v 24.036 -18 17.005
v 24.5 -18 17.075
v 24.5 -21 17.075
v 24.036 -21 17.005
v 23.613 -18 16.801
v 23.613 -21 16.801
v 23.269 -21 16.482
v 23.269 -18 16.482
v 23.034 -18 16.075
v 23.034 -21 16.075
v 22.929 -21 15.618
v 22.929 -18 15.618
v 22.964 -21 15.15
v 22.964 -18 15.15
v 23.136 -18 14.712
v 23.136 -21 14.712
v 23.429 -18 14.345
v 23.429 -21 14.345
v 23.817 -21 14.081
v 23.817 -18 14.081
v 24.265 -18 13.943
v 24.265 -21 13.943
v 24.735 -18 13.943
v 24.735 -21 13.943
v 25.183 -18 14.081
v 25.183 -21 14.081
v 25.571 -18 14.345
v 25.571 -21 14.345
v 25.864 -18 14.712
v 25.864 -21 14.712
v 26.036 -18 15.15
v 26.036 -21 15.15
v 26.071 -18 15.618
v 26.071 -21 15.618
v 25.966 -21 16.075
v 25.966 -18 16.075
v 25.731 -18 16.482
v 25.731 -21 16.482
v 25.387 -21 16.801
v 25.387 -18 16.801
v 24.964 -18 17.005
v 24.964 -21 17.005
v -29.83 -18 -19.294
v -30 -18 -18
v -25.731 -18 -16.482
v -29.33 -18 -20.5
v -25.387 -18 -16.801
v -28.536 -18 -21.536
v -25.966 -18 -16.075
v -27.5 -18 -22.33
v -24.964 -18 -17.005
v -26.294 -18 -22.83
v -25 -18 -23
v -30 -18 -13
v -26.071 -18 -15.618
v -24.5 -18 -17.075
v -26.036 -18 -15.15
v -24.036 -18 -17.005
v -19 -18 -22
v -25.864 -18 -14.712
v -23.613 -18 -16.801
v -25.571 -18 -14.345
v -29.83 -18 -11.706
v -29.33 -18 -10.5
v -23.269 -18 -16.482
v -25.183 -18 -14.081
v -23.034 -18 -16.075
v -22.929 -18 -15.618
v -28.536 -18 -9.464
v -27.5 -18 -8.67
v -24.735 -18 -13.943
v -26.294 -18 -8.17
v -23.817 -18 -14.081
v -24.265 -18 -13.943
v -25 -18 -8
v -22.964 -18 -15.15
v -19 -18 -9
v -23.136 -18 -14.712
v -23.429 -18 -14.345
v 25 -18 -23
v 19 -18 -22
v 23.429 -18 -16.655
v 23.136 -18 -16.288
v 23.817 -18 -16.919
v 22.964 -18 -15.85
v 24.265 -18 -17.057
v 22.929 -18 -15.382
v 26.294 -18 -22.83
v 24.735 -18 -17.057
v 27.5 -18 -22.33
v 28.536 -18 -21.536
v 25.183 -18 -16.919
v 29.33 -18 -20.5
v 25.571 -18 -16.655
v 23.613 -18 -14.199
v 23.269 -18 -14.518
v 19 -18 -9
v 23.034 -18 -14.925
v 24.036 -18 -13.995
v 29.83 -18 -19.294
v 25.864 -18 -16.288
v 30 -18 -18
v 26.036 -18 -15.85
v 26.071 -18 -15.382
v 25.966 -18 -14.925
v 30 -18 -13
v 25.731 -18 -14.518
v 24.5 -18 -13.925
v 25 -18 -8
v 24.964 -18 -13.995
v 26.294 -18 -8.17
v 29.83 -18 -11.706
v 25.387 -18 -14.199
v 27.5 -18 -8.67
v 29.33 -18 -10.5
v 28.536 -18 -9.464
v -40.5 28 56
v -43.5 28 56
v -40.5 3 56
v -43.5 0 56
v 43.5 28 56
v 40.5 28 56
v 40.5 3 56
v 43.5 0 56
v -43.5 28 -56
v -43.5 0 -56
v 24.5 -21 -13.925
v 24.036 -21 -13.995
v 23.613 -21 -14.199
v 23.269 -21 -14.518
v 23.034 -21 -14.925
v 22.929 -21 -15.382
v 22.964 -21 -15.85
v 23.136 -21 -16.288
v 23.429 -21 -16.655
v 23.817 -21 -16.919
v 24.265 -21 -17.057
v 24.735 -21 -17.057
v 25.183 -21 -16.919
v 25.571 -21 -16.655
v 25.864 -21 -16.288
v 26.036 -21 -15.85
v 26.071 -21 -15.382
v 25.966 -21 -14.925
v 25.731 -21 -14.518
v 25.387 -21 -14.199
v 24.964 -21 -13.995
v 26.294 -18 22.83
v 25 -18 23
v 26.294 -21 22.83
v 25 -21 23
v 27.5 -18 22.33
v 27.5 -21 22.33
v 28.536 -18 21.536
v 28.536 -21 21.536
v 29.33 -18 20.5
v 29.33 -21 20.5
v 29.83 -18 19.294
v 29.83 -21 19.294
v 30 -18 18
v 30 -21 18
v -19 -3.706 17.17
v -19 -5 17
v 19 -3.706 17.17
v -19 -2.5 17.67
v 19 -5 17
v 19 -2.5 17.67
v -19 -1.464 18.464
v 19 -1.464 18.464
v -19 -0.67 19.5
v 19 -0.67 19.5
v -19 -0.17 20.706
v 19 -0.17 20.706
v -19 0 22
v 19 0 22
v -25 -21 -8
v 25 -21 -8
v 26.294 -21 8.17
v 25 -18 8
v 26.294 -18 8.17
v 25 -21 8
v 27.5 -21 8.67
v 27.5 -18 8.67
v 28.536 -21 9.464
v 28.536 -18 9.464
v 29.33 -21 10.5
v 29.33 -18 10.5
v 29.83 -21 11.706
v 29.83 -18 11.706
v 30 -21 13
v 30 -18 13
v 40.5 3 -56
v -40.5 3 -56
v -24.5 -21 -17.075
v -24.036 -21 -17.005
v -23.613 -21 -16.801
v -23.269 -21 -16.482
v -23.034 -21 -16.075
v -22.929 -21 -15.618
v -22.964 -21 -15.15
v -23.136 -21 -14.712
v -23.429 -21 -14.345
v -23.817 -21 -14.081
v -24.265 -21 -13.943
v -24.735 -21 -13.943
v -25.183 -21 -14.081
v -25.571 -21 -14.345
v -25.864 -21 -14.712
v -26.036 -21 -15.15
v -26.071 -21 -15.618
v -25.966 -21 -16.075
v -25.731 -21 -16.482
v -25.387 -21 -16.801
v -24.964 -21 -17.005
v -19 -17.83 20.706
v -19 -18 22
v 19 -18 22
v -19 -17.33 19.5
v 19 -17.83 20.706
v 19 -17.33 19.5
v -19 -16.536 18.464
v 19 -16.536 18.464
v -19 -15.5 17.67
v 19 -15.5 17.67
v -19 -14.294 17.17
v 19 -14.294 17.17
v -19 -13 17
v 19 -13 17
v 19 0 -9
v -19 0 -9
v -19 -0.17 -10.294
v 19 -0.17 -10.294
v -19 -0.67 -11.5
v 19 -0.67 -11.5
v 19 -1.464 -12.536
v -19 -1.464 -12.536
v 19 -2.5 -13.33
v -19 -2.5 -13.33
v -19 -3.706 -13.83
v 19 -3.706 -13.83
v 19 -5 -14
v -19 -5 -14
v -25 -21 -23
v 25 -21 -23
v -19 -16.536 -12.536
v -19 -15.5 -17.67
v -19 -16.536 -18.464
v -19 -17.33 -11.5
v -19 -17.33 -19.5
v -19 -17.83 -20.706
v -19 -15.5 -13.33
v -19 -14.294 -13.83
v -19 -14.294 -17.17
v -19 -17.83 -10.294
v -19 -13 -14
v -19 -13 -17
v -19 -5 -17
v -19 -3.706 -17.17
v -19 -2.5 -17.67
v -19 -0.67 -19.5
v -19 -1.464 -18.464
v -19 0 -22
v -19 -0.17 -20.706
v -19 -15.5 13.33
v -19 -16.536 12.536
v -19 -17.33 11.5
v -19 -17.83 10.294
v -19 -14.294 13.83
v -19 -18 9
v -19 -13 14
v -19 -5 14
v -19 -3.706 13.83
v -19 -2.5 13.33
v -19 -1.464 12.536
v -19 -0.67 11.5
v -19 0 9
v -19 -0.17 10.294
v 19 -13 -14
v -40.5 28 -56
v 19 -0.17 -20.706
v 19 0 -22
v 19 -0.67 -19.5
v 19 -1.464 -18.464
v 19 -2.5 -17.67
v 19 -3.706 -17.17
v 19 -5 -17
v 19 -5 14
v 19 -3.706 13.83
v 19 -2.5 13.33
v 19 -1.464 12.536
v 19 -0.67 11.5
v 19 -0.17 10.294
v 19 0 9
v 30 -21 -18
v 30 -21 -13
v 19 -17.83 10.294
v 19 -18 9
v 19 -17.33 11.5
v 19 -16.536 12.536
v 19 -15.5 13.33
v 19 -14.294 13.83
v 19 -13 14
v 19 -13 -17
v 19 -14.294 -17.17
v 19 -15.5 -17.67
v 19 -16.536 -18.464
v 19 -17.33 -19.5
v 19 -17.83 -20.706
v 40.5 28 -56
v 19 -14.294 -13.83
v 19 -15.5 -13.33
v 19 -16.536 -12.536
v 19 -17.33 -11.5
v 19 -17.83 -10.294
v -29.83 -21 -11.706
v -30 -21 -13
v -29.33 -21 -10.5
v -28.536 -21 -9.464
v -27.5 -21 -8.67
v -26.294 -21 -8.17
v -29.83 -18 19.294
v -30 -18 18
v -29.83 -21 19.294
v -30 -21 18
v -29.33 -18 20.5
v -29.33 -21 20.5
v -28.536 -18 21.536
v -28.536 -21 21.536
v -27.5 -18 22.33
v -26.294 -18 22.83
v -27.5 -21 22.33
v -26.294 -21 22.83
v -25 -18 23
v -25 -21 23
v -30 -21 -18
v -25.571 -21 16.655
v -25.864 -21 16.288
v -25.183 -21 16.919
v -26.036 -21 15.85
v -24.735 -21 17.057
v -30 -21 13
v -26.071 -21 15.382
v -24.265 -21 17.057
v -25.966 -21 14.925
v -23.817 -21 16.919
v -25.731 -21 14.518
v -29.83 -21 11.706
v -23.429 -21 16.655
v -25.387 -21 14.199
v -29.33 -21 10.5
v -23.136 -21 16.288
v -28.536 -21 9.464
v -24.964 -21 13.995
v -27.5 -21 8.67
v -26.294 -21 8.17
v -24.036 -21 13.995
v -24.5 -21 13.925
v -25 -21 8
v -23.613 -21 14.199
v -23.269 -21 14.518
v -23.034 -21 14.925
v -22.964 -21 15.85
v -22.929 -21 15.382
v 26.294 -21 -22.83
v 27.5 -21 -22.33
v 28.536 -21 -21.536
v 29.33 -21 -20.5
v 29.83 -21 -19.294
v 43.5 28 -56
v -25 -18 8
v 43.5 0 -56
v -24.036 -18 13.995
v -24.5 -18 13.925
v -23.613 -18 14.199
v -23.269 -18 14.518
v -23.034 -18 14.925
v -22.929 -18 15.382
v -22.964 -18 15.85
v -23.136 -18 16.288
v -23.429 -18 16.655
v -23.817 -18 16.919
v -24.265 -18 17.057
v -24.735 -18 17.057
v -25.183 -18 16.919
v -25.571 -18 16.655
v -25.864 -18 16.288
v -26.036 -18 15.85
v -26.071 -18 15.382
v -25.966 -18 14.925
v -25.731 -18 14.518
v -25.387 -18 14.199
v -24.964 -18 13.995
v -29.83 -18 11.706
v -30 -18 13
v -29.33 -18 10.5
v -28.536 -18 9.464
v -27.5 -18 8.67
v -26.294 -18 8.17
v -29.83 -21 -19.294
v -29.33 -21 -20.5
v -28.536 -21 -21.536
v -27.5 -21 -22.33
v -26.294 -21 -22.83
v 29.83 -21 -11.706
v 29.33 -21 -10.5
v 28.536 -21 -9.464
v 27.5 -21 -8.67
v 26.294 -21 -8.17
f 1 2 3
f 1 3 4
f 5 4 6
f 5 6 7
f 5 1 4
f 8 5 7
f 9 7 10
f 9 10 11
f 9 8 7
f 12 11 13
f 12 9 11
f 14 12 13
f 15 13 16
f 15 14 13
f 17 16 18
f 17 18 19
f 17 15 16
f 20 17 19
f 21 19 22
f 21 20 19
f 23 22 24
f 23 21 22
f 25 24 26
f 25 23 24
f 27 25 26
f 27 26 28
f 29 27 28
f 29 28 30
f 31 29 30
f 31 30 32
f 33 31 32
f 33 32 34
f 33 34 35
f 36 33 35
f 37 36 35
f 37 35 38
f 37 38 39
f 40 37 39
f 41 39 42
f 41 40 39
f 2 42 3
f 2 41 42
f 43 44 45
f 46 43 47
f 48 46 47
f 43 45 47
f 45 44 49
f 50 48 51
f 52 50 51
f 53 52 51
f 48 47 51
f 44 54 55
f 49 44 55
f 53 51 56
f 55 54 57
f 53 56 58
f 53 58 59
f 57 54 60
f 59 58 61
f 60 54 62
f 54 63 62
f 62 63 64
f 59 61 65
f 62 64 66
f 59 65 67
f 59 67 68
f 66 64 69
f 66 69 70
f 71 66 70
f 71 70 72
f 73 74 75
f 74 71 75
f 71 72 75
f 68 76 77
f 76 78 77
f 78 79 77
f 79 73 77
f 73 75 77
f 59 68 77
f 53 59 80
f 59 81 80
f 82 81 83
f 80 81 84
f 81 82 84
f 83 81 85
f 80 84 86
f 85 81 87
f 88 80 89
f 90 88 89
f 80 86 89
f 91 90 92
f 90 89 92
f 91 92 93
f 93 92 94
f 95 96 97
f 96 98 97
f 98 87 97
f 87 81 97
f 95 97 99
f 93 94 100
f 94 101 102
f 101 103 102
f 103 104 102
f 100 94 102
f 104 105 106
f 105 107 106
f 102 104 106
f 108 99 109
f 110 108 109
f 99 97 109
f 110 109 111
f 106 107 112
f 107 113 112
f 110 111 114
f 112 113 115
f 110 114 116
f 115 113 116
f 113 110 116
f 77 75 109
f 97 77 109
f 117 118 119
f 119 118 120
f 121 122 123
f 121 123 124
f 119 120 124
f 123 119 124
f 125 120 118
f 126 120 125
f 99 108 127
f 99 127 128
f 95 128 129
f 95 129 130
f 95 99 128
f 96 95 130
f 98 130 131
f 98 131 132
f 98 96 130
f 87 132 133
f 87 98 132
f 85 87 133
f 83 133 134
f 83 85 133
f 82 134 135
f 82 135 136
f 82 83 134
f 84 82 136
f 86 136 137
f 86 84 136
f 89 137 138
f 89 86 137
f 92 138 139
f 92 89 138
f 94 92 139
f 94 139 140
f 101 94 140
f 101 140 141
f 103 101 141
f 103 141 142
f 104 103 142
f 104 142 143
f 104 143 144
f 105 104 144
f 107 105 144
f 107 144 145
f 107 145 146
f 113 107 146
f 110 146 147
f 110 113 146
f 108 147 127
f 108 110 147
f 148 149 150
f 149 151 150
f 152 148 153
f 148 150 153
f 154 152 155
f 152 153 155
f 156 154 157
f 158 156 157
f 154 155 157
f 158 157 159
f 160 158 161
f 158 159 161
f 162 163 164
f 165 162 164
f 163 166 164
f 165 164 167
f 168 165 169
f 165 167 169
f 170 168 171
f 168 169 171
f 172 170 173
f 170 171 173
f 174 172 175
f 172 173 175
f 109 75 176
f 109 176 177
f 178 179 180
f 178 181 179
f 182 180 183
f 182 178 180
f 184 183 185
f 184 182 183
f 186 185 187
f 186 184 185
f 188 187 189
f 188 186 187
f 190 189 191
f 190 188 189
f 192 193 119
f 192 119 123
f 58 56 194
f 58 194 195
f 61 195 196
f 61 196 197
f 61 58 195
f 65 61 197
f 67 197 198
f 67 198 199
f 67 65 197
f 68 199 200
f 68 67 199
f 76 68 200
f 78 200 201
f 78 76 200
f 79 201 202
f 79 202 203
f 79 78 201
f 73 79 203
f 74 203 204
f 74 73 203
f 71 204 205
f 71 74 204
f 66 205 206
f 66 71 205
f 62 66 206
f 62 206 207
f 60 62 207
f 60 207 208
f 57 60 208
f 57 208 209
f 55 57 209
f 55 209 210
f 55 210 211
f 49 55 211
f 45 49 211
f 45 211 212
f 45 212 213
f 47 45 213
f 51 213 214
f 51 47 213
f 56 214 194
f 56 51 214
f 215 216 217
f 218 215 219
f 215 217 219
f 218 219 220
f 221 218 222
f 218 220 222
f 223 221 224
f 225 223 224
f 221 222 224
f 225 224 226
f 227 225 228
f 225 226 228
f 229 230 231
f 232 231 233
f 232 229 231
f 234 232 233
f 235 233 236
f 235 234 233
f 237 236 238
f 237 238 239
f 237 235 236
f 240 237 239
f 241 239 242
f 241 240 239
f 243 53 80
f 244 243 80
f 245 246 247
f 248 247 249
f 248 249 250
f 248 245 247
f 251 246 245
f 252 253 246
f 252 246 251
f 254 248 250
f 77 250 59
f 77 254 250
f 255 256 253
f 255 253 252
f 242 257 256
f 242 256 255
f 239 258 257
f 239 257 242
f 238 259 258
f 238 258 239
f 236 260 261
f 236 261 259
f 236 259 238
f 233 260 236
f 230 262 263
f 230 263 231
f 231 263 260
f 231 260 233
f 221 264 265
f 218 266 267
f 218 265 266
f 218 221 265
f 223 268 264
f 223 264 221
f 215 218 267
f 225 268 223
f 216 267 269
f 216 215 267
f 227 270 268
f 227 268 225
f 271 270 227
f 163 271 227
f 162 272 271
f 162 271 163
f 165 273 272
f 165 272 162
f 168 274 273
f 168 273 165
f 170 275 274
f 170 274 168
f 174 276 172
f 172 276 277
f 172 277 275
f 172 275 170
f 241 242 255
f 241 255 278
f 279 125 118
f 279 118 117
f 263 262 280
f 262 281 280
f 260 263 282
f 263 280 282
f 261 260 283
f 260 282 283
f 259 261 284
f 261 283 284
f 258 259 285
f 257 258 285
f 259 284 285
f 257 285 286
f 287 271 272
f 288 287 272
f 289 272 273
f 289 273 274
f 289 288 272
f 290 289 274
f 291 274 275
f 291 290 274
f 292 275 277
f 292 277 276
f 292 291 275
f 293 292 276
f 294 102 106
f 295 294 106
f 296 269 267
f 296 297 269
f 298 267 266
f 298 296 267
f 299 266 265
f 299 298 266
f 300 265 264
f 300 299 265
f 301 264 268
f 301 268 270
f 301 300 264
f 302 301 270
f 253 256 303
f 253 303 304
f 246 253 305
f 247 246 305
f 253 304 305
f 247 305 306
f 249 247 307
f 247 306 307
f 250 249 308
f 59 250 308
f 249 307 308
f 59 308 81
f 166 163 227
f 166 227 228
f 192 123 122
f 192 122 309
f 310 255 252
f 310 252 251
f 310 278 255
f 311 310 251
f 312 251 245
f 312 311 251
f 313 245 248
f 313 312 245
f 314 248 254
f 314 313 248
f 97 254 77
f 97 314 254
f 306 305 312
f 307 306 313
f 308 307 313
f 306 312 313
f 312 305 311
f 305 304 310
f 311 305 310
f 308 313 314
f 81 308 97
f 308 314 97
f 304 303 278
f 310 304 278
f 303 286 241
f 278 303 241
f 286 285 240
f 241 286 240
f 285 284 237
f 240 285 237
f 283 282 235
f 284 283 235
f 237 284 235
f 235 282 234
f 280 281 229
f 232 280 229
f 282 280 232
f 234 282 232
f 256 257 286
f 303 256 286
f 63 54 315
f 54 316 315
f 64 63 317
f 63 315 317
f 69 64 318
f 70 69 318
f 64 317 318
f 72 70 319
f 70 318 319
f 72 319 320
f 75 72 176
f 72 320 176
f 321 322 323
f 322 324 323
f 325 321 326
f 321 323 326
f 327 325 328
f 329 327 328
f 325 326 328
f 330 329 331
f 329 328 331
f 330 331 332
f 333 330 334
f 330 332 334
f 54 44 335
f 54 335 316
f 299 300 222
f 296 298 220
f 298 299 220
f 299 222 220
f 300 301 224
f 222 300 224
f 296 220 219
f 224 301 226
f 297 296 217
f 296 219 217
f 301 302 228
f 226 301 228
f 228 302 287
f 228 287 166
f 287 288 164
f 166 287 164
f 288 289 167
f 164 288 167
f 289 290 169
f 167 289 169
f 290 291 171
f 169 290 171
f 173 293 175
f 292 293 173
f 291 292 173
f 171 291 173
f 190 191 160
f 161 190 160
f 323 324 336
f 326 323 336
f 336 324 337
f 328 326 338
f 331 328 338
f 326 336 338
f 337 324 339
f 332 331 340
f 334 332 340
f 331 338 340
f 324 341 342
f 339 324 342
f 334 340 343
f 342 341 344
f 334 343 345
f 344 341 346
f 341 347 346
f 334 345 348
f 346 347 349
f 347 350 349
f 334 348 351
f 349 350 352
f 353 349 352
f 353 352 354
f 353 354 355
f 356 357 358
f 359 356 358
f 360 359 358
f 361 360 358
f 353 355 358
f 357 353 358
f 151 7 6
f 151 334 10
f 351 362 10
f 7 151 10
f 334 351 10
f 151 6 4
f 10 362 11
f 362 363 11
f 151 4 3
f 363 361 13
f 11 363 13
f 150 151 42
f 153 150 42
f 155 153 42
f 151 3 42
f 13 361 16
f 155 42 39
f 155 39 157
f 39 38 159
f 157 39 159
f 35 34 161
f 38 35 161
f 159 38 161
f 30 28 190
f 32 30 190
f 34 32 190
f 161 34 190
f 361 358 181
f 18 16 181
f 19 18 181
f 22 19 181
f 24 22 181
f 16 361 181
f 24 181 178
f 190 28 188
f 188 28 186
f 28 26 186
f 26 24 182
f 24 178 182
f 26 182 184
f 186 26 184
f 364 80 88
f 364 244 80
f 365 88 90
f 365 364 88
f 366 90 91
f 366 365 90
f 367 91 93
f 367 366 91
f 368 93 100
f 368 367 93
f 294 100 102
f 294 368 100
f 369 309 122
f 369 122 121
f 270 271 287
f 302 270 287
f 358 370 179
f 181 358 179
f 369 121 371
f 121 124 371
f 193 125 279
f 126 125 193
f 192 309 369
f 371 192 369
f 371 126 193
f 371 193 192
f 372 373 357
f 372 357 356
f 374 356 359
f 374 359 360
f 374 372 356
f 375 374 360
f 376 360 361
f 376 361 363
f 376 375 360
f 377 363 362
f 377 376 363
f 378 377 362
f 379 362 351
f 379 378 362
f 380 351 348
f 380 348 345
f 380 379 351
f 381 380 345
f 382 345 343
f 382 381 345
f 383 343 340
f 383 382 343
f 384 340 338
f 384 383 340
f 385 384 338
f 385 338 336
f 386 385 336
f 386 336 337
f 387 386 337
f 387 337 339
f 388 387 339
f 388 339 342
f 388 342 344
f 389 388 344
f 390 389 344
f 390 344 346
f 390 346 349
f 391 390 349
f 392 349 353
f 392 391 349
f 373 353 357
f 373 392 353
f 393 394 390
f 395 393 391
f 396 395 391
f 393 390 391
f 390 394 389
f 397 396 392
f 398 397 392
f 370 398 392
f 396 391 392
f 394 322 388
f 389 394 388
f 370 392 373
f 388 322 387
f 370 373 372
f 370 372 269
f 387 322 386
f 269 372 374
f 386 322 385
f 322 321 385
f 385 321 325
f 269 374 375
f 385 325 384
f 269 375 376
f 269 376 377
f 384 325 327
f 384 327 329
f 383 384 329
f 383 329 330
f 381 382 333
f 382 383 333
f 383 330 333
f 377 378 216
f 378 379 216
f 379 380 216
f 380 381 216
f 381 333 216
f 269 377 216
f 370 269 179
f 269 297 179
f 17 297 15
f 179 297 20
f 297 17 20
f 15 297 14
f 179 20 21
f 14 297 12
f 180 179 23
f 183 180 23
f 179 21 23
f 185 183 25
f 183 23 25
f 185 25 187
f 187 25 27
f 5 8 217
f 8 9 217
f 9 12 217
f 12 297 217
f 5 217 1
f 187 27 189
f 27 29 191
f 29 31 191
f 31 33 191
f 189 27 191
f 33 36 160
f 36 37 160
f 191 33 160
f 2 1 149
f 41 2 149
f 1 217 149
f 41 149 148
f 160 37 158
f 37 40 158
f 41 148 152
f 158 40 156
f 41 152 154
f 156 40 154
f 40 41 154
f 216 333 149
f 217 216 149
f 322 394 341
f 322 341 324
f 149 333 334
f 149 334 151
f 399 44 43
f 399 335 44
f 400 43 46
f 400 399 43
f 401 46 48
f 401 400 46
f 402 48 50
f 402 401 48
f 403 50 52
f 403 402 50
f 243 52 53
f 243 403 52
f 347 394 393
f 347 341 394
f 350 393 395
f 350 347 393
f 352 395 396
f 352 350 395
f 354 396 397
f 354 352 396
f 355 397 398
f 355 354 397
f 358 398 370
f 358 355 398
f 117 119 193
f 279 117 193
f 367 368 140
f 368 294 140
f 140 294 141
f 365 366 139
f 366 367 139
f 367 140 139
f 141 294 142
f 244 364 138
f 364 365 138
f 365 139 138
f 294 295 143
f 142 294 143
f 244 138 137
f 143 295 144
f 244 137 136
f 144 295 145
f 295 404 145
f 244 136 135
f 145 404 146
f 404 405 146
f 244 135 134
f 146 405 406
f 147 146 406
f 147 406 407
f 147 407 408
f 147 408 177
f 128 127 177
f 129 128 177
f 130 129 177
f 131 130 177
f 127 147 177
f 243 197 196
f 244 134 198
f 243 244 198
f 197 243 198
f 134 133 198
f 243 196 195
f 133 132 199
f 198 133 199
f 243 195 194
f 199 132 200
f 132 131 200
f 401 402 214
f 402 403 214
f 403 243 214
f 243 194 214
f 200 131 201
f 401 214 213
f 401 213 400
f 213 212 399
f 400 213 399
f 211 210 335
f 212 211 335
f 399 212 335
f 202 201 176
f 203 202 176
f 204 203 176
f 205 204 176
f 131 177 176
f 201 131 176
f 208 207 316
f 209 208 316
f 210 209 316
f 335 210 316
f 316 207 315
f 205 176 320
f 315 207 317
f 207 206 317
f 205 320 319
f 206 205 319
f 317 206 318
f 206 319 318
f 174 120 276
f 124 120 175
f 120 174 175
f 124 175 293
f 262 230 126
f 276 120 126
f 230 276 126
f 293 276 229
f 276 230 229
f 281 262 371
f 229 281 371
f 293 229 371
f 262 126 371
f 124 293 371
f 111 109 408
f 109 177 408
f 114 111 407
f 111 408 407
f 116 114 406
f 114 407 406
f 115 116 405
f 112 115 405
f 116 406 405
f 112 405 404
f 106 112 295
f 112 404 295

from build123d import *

# Parameters (mm, degrees)
SKETCH1_W             = 87
SKETCH1_H             = 112
BOSS_EXTRUDE1_DEPTH   = 3
SKETCH2_W             = 38
SKETCH2_H             = 3
BOSS_EXTRUDE2_DEPTH   = 18
SKETCH8_W             = 60
SKETCH8_H             = 15
SKETCH8_R             = 1.575
SKETCH8_W_2           = 38
SKETCH8_H_2           = 3
BOSS_EXTRUDE5_DEPTH   = 3
BOSS_EXTRUDE5_2_DEPTH = 3
SKETCH9_W             = 38
SKETCH9_H             = 3
BOSS_EXTRUDE6_DEPTH   = 3
SKETCH10_W            = 38
SKETCH10_H            = 3
BOSS_EXTRUDE7_DEPTH   = 3
FILLET2_R             = 5
FILLET3_R             = 5
FILLET4_R             = 5
SKETCH12_W            = 3
SKETCH12_H            = 112
BOSS_EXTRUDE8_DEPTH   = 25


with BuildPart() as part:
    # Sketch1 → Boss-Extrude1 (new body)
    with BuildSketch(Plane(origin=(0, 0, 0), x_dir=(1, 0, 0), z_dir=(0, 1, 0))):
        Rectangle(SKETCH1_W, SKETCH1_H)
    extrude(amount=BOSS_EXTRUDE1_DEPTH)

    # Sketch2 → Boss-Extrude2 (add)
    with BuildSketch(Plane.XZ):
        with Locations((0, -15.5)):
            Rectangle(SKETCH2_W, SKETCH2_H)
        with Locations((0, 15.5)):
            Rectangle(SKETCH2_W, SKETCH2_H)
    extrude(amount=BOSS_EXTRUDE2_DEPTH)



with BuildPart() as body_2:
    # Sketch8 → Boss-Extrude5 (new body)
    with BuildSketch(Plane.XZ.offset(18)):
        with Locations((0, 15.5)):
            Rectangle(SKETCH8_W, SKETCH8_H)
        with Locations(Location((-24.5, 15.5, 0), (0, 0, 270))):
            Circle(SKETCH8_R, mode=Mode.SUBTRACT)
        with Locations(Location((24.5, 15.5, 0), (0, 0, 90))):
            Circle(SKETCH8_R, mode=Mode.SUBTRACT)
        with Locations((0, 15.5)):
            Rectangle(SKETCH8_W_2, SKETCH8_H_2, mode=Mode.SUBTRACT)
    extrude(amount=BOSS_EXTRUDE5_DEPTH)


with BuildPart() as body_3:
    # Sketch8 → Boss-Extrude5 2 (new body)
    with BuildSketch(Plane.XZ.offset(18)):
        with Locations((0, -15.5)):
            Rectangle(SKETCH8_W, SKETCH8_H)
        with Locations(Location((-24.5, -15.5, 0), (0, 0, 270))):
            Circle(SKETCH8_R, mode=Mode.SUBTRACT)
        with Locations(Location((24.5, -15.5, 0), (0, 0, 90))):
            Circle(SKETCH8_R, mode=Mode.SUBTRACT)
        with Locations((0, -15.5)):
            Rectangle(SKETCH8_W_2, SKETCH8_H_2, mode=Mode.SUBTRACT)
    extrude(amount=BOSS_EXTRUDE5_2_DEPTH)


with BuildPart() as part_1:
    add(part.part)

    add(body_2.part)  # Boss-Extrude6 merges body 2
    # Sketch9 → Boss-Extrude6 (add)
    with BuildSketch(Plane.XY.offset(14)):
        with Locations((0, -19.5)):
            Rectangle(SKETCH9_W, SKETCH9_H)
    extrude(amount=BOSS_EXTRUDE6_DEPTH)


    add(body_3.part)  # Boss-Extrude7 merges body 3
    # Sketch10 → Boss-Extrude7 (add)
    with BuildSketch(Plane(origin=(0, 0, -14), x_dir=(-1, 0, 0), z_dir=(0, 0, -1))):
        with Locations((0, -19.5)):
            Rectangle(SKETCH10_W, SKETCH10_H)
    extrude(amount=BOSS_EXTRUDE7_DEPTH)

    # Fillet2
    fillet2_edges = [part_1.edges().sort_by_distance(p)[0] for p in [
        (-30, -19.5, -8),
        (30, -19.5, -8),
        (30, -19.5, -23),
        (-30, -19.5, -23),
    ]]
    fillet(fillet2_edges, radius=FILLET2_R)

    # Fillet3
    fillet3_edges = [part_1.edges().sort_by_distance(p)[0] for p in [
        (-30, -19.5, 23),
        (-30, -19.5, 8),
        (30, -19.5, 8),
        (30, -19.5, 23),
    ]]
    fillet(fillet3_edges, radius=FILLET3_R)

    # Fillet4
    fillet4_edges = [part_1.edges().sort_by_distance(p)[0] for p in [
        (0, 0, 14),
        (0, 0, 17),
        (0, 0, -14),
        (0, 0, -17),
        (0, -18, -14),
        (0, -18, -17),
        (0, -18, 17),
        (0, -18, 14),
    ]]
    fillet(fillet4_edges, radius=FILLET4_R)

    # Sketch12 → Boss-Extrude8 (add)
    with BuildSketch(Plane(origin=(0, 3, 0), x_dir=(1, 0, 0), z_dir=(0, 1, 0))):
        with Locations((42, 0)):
            Rectangle(SKETCH12_W, SKETCH12_H)
        with Locations((-42, 0)):
            Rectangle(SKETCH12_W, SKETCH12_H)
    extrude(amount=BOSS_EXTRUDE8_DEPTH)


solid = part_1.part
